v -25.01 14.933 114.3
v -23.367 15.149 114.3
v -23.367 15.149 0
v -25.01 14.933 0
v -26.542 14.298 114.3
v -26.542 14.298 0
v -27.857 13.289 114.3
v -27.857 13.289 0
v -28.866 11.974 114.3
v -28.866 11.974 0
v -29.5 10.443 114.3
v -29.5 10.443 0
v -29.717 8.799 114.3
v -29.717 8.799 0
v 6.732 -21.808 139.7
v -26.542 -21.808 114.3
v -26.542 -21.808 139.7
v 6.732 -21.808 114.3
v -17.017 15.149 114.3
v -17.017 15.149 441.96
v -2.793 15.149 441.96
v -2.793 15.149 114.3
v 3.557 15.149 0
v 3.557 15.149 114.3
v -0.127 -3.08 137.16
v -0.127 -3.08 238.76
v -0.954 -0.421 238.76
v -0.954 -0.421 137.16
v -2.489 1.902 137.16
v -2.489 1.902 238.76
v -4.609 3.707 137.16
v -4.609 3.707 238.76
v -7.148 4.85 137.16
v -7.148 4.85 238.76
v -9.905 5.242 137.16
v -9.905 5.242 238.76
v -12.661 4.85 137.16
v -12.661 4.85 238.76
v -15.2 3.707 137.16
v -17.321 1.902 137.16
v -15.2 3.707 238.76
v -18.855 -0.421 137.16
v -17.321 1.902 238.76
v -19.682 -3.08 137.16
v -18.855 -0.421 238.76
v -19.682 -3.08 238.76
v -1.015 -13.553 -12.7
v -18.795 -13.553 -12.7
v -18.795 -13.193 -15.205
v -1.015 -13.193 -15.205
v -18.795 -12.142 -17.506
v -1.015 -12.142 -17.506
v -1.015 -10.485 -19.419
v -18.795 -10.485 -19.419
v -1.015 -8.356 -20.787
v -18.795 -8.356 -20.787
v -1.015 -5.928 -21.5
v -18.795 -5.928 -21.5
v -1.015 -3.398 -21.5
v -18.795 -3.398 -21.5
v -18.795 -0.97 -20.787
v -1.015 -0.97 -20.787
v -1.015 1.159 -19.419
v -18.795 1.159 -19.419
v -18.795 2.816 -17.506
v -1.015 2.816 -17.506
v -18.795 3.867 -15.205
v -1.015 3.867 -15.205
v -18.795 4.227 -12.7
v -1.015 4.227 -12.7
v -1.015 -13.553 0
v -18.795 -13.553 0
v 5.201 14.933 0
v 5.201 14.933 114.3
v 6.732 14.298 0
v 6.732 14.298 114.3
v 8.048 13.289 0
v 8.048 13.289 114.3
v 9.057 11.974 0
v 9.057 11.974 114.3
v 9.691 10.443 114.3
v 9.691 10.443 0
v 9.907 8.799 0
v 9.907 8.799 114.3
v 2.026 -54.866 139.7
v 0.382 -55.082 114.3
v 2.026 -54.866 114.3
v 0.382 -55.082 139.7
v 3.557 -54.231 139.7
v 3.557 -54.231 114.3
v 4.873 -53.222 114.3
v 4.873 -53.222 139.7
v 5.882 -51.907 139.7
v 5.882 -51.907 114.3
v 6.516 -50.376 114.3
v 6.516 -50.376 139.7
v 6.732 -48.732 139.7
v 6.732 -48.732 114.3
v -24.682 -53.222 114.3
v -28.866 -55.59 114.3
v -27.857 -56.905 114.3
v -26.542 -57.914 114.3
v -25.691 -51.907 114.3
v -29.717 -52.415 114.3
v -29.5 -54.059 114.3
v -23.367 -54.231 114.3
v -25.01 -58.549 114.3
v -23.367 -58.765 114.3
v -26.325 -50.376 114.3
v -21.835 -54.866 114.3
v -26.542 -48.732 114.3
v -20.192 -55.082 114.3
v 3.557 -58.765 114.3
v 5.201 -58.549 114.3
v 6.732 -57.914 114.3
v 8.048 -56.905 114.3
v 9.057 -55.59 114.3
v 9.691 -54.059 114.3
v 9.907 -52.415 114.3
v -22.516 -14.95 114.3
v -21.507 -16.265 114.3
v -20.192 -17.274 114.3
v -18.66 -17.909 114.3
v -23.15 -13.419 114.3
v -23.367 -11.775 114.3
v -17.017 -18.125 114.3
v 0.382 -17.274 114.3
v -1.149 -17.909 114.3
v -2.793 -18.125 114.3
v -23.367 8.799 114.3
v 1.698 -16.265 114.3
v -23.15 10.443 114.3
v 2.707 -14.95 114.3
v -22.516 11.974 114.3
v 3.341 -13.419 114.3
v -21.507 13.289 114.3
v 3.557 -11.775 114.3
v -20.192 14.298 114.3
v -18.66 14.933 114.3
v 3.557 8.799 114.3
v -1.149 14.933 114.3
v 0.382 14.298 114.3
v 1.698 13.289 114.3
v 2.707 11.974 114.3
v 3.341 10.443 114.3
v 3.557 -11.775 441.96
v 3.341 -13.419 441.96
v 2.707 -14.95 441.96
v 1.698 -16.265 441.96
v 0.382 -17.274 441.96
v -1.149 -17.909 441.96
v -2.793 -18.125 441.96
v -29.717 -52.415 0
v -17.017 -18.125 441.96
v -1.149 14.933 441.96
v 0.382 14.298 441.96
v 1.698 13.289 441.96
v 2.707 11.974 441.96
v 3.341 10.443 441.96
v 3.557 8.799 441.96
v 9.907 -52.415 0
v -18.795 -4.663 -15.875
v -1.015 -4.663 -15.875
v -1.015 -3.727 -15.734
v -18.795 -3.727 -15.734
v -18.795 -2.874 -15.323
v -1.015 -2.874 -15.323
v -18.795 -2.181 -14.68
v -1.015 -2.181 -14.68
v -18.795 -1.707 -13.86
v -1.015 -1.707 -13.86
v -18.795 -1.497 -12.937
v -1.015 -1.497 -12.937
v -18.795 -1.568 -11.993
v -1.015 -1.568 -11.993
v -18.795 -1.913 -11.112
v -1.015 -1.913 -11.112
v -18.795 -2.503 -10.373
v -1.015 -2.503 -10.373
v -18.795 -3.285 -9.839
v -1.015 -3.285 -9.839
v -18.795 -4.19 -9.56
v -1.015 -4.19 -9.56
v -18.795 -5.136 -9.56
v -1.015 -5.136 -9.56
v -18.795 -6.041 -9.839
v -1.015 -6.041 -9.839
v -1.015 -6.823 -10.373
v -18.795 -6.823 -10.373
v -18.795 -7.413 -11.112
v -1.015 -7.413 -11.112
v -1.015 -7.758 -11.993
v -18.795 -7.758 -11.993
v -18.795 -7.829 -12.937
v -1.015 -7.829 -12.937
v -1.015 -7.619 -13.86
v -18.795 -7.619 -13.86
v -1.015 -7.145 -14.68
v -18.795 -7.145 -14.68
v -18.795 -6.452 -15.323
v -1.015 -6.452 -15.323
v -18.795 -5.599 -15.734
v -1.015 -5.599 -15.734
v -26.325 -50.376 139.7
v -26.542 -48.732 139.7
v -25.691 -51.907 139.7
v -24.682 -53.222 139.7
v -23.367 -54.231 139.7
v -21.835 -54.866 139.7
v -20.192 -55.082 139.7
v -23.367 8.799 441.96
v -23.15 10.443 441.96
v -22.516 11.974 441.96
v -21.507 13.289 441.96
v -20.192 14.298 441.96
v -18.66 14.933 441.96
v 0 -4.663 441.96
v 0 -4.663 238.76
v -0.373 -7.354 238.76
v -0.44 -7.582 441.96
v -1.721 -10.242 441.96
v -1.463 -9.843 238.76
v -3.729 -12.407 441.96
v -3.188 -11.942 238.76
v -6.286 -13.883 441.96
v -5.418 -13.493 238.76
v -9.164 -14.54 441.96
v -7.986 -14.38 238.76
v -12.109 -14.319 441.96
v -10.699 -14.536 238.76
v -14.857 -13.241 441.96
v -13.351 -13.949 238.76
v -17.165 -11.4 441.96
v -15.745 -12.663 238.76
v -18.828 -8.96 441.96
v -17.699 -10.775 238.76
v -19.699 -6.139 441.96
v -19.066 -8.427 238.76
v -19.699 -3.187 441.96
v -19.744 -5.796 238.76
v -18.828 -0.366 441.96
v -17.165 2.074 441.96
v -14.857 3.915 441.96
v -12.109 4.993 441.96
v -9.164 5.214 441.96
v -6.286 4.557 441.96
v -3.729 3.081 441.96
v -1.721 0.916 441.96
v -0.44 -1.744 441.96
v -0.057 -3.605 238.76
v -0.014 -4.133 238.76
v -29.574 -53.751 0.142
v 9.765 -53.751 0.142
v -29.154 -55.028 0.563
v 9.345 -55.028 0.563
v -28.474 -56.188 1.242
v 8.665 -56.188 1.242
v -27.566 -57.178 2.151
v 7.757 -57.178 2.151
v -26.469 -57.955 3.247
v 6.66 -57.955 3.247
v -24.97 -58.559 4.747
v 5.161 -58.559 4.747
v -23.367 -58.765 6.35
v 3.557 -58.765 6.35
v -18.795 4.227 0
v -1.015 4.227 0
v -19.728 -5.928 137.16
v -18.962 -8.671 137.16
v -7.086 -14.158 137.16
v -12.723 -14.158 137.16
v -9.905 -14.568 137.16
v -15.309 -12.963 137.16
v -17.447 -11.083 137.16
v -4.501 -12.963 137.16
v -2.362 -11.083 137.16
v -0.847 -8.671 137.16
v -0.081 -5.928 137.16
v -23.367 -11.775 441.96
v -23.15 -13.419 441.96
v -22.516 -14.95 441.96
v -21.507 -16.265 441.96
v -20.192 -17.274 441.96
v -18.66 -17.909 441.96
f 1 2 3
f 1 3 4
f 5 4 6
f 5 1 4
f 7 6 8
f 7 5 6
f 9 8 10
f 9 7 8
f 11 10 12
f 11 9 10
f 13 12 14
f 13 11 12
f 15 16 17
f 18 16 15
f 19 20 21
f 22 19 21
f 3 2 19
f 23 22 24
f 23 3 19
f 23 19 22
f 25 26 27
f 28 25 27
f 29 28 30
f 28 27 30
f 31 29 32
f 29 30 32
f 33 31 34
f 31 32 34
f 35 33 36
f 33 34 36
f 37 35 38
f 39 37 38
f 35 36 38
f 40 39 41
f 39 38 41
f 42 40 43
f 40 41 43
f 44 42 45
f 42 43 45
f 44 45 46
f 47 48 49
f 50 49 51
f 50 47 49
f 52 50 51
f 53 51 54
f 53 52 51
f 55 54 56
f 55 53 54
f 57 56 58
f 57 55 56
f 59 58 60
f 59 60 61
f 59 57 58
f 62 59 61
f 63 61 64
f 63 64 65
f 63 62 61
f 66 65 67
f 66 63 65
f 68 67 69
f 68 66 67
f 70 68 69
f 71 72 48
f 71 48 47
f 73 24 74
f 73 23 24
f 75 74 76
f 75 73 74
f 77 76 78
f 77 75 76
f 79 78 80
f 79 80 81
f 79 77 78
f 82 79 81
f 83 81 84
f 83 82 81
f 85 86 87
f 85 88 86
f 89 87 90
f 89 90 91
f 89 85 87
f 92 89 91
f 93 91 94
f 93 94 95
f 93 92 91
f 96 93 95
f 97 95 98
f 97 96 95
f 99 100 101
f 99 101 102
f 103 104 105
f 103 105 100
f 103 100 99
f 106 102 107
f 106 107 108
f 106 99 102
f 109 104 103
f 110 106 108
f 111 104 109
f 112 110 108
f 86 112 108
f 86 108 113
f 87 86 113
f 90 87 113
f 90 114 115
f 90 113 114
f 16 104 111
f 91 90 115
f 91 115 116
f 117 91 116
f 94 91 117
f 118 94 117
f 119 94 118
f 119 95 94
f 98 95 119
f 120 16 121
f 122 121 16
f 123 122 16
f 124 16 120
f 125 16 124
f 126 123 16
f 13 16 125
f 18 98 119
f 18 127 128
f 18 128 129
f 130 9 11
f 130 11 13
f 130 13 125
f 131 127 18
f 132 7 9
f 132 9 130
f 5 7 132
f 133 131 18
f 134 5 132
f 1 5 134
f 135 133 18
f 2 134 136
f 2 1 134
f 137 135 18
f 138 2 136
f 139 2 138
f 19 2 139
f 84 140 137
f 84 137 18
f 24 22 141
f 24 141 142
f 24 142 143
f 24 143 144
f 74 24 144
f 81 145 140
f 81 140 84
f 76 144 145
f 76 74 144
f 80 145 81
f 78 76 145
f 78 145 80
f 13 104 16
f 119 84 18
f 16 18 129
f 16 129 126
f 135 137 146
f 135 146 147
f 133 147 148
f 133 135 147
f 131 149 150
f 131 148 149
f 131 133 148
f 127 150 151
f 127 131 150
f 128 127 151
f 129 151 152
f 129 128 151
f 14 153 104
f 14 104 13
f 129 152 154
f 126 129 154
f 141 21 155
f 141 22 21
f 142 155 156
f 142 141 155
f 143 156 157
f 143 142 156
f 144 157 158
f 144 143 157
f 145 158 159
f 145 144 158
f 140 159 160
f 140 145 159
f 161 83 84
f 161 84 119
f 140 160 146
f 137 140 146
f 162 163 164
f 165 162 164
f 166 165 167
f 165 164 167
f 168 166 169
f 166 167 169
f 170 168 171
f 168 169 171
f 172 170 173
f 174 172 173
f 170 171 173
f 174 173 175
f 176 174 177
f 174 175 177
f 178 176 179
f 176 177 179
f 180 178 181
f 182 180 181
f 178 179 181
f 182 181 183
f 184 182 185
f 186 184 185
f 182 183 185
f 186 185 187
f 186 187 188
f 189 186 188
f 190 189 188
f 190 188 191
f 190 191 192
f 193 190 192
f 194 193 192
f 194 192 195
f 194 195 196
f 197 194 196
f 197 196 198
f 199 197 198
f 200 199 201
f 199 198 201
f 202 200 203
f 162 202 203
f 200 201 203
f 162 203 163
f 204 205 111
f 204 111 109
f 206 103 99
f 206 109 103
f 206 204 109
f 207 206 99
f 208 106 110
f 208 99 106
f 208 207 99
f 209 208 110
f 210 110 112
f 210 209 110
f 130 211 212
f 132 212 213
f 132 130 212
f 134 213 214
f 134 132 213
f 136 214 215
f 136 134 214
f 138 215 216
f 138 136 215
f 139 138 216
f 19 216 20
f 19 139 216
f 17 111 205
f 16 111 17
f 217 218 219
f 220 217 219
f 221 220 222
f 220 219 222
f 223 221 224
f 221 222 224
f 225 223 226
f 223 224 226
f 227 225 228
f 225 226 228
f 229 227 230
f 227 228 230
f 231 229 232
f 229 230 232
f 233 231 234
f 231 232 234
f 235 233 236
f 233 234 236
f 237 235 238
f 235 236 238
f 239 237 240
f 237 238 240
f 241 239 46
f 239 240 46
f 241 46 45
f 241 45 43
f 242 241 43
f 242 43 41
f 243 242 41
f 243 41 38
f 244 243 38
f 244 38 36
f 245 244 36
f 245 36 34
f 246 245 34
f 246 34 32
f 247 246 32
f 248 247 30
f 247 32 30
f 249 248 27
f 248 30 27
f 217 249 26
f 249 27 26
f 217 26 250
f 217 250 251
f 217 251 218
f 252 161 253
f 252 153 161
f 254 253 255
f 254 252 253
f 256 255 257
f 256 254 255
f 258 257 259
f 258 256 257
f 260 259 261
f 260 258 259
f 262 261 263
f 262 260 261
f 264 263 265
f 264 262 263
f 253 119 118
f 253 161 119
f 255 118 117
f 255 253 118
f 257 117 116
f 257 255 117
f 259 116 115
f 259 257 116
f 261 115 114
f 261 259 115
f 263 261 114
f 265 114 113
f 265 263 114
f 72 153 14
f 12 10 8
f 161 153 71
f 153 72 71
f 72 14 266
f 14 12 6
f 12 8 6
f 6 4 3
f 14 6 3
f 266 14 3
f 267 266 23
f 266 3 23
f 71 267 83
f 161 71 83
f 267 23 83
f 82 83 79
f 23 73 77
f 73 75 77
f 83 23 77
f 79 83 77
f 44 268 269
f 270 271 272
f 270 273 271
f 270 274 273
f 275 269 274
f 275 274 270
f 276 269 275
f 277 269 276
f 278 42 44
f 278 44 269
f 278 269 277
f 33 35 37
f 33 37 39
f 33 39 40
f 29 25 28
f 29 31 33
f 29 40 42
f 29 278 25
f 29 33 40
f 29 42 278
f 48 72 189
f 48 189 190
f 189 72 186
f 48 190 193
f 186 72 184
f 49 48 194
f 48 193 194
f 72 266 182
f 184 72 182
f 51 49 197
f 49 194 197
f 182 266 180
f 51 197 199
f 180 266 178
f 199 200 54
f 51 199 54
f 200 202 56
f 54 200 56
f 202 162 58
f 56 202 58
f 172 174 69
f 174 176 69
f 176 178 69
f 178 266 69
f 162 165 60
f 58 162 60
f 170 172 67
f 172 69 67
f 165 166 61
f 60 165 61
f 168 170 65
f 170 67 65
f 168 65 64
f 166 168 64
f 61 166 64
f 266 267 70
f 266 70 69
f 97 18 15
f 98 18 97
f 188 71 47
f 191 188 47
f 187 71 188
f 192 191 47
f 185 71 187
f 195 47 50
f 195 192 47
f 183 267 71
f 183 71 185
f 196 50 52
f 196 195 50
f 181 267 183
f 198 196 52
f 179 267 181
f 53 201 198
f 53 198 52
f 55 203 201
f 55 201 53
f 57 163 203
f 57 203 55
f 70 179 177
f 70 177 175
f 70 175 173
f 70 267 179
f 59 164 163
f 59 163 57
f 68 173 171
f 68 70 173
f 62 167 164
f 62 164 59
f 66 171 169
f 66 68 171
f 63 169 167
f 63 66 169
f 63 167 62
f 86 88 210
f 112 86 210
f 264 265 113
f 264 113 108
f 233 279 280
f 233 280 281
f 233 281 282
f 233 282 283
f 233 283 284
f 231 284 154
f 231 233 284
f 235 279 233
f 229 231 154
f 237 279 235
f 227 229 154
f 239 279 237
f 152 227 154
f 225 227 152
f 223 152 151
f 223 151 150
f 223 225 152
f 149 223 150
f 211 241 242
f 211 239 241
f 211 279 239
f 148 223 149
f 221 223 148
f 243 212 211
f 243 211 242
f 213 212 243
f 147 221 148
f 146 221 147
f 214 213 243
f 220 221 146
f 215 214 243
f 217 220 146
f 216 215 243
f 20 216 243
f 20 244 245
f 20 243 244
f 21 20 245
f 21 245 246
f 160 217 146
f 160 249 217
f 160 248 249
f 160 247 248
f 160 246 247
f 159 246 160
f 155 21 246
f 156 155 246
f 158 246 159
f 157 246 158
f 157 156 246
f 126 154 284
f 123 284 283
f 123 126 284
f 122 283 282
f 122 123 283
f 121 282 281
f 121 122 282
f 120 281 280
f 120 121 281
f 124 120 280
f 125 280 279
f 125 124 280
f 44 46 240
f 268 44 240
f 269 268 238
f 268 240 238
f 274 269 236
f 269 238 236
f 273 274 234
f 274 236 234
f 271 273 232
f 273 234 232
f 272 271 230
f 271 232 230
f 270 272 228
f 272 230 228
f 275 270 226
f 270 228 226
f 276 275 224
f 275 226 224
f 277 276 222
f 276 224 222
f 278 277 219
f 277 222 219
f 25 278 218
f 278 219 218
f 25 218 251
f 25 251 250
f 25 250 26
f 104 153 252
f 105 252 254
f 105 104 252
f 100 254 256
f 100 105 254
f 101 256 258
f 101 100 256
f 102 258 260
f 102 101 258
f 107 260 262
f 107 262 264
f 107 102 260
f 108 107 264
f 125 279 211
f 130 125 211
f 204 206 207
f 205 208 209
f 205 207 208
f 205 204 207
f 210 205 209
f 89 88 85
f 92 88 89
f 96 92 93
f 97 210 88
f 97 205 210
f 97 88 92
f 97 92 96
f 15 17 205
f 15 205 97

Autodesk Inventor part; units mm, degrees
ref_plane "YZ Plane" through (0, 0, 0) normal (1, 0, 0) x (0, 1, 0)
ref_plane "XZ Plane" through (0, 0, 0) normal (0, 1, 0) x (-1, 0, 0)
ref_plane "XY Plane" through (0, 0, 0) normal (0, 0, 1) x (1, 0, 0)
sketch "Sketch1" plane through (0, 0, 0) normal (0, 0, 1) x (1, 0, 0)
  line L0 (-29.7166, 15.149) -> (9.9074, 15.149)
  line L1 (9.9074, 15.149) -> (9.9074, -58.765)
  line L2 (9.9074, -58.765) -> (-29.7166, -58.765)
  line L3 (-29.7166, -58.765) -> (-29.7166, 15.149)
  point P0 (0, 0)
  dimension "d0" = 39.624
  dimension "d1" = 73.914
extrude "Extrusion1" add sketch "Sketch1" along normal blind 76.2
sketch "Sketch2" plane through (0, 0, 76.2) normal (0, 0, 1) x (1, 0, 0)
  line L0 (9.9074, 15.149) -> (9.9074, -58.765) projected
  line L1 (-29.7166, 15.149) -> (9.9074, 15.149)
  line L2 (9.9074, 15.149) -> (9.9074, -24.475)
  line L3 (9.9074, -24.475) -> (-29.7166, -24.475)
  line L4 (-29.7166, -24.475) -> (-29.7166, 15.149)
  line L5 (-29.7166, -24.475) -> (-23.3666, -24.475)
  line L6 (-23.3666, -24.475) -> (-23.3666, -18.125)
  line L7 (-23.3666, -18.125) -> (-29.7166, -18.125)
  line L8 (-29.7166, -18.125) -> (-29.7166, -24.475)
  line L9 (-23.3666, -18.125) -> (3.5574, -18.125)
  line L10 (3.5574, -18.125) -> (3.5574, 15.149)
  line L11 (3.5574, 15.149) -> (-23.3666, 15.149)
  line L12 (-23.3666, 15.149) -> (-23.3666, -18.125)
  point P0 (0, 0)
  dimension "d4" = 39.624
  dimension "d5" = 6.35
  dimension "d6" = 6.35
  dimension "d7" = 26.924
extrude "Extrusion2" add sketch "Sketch2" along normal blind 162.56 contours L10 L9 L12 L1
sketch "Sketch3" plane through (0, 0, 238.76) normal (0, 0, 1) x (1, 0, 0)
  line L0 (-23.3666, 15.149) -> (3.5574, -18.125)
  line L1 (3.5574, 15.149) -> (-23.3666, -18.125)
  circle A0 centre (-9.9046, -1.488) radius 9.906
  point P0 (0, 0)
  dimension "d10" = 19.812
extrude "Extrusion3" cut sketch "Sketch3" against normal blind 203.2
sketch "Sketch4" plane through (0, 0, 76.2) normal (0, 0, 1) x (1, 0, 0)
  line L0 (3.5574, 15.149) -> (3.5574, -18.125) projected
  line L1 (3.5574, -18.125) -> (-23.3666, -18.125) projected
  line L2 (-23.3666, -18.125) -> (-23.3666, 15.149) projected
  line L3 (-29.7166, 15.149) -> (-23.3666, 15.149) projected
  line L4 (-29.7166, -58.765) -> (-29.7166, 15.149) projected
  line L5 (9.9074, -58.765) -> (-29.7166, -58.765) projected
  line L6 (9.9074, 15.149) -> (9.9074, -58.765) projected
  line L7 (3.5574, 15.149) -> (9.9074, 15.149) projected
  point P0 (0, 0)
extrude "Extrusion4" cut sketch "Sketch4" against normal blind 25.4
sketch "Sketch5" plane through (0, 0, 50.8) normal (0, 0, 1) x (1, 0, 0)
  line L0 (-26.5416, -21.808) -> (6.7324, -21.808)
  line L1 (6.7324, -21.808) -> (6.7324, -55.082)
  line L2 (6.7324, -55.082) -> (-26.5416, -55.082)
  line L3 (-26.5416, -55.082) -> (-26.5416, -21.808)
  point P0 (0, 0)
  dimension "d15" = 33.274
extrude "Extrusion5" add sketch "Sketch5" along normal blind 88.9
sketch "Sketch6" plane through (0, 0, 50.8) normal (0, 0, 1) x (1, 0, 0)
  line L0 (6.7324, -21.808) -> (6.7324, -55.082) projected
  line L1 (6.7324, -55.082) -> (-26.5416, -55.082) projected
  line L2 (-26.5416, -55.082) -> (-26.5416, -21.808) projected
  line L3 (-26.5416, -21.808) -> (6.7324, -21.808) projected
  line L4 (3.5574, -18.125) -> (-23.3666, -18.125) projected
  line L5 (-23.3666, -18.125) -> (-23.3666, 15.149) projected
  line L6 (-29.7166, 15.149) -> (-23.3666, 15.149) projected
  line L7 (-29.7166, -58.765) -> (-29.7166, 15.149) projected
  line L8 (9.9074, -58.765) -> (-29.7166, -58.765) projected
  line L9 (9.9074, 15.149) -> (9.9074, -58.765) projected
  line L10 (3.5574, 15.149) -> (9.9074, 15.149) projected
  line L11 (3.5574, 15.149) -> (3.5574, -18.125) projected
  point P0 (0, 0)
extrude "Extrusion6" add sketch "Sketch6" along normal blind 25.4
sketch "Sketch7" plane through (0, 0, 0) normal (0, 0, -1) x (-1, 0, 0)
  line L0 (-9.9074, 15.149) -> (-9.9074, -58.765) projected
  line L1 (29.7166, -58.765) -> (29.7166, 15.149) projected
  line L2 (-9.9074, 15.149) -> (29.7166, -24.475)
  line L3 (-9.9074, 15.149) -> (46.1294, 15.149) construction
  line L4 (29.7166, 15.149) -> (-9.9074, -24.475)
  line L5 (1.0146, 4.227) -> (18.7946, 4.227)
  line L6 (1.0146, 4.227) -> (18.7946, 4.227)
  line L7 (18.7946, 4.227) -> (18.7946, -13.553)
  line L8 (18.7946, -13.553) -> (1.0146, -13.553)
  line L9 (1.0146, -13.553) -> (1.0146, 4.227)
  point P0 (0, 0)
  dimension "d20" = 45
  dimension "d21" = 17.78
extrude "Extrusion7" add sketch "Sketch7" along normal blind 12.7 contours L5 L4 L2 | L2 L4 L9 | L4 L2 L8 | L4 L7 L2
sketch "Sketch8" plane through (-18.7946, -13.553, 0) normal (-1, 0, 0) x (0, 0, 1)
  line L0 (-12.7, 17.78) -> (-12.7, 0) projected
  circle A0 centre (-12.7, 8.89) radius 3.175
  point P0 (0, 13.553)
  dimension "d24" = 6.35
extrude "Extrusion8" cut sketch "Sketch8" against normal blind 25.4
sketch "Sketch9" plane through (-1.0146, -13.553, 0) normal (1, 0, 0) x (0, 0, -1)
  arc A0 (12.7, 12.065) -> (12.7, 5.715) centre (12.7, 8.89) ccw projected
  circle A1 centre (12.7, 8.89) radius 3.175
  circle A2 centre (12.7, 8.89) radius 8.89
  point P0 (0, 13.553)
extrude "Extrusion9" add sketch "Sketch9" against normal blind 17.78
sketch "Sketch10" plane through (0, 0, 76.2) normal (0, 0, 1) x (1, 0, 0)
  line L0 (-26.5416, -55.082) -> (6.7324, -55.082) projected
  line L1 (-26.5416, -21.808) -> (-26.5416, -55.082) projected
  line L2 (6.7324, -21.808) -> (-26.5416, -21.808) projected
  line L3 (6.7324, -55.082) -> (6.7324, -21.808) projected
  line L4 (3.5574, -18.125) -> (3.5574, 15.149) projected
  line L5 (-23.3666, -18.125) -> (3.5574, -18.125) projected
  line L6 (-23.3666, 15.149) -> (-23.3666, -18.125) projected
  line L7 (-29.7166, 15.149) -> (-23.3666, 15.149) projected
  line L8 (-29.7166, -58.765) -> (-29.7166, 15.149) projected
  line L9 (9.9074, -58.765) -> (-29.7166, -58.765) projected
  line L10 (9.9074, 15.149) -> (9.9074, -58.765) projected
  line L11 (3.5574, 15.149) -> (9.9074, 15.149) projected
  point P0 (0, 0)
extrude "Extrusion10" add sketch "Sketch10" along normal blind 38.1
fillet "Fillet1" radius 6.35 11 edges at (9.9074, 15.149, 57.15) (-29.7166, 15.149, 57.15) (9.9074, -58.765, 57.15) (-29.7166, -58.765, 57.15) (-26.5416, -55.082, 127) (6.7324, -55.082, 127) (-9.9046, -58.765, 0) (-23.3666, 15.149, 176.53) (3.5574, 15.149, 176.53) (-23.3666, -18.125, 176.53) (3.5574, -18.125, 176.53)
sketch "Sketch11" plane through (0, 0, 238.76) normal (0, 0, 1) x (1, 0, 0)
  line L0 (-17.0166, 15.149) -> (-2.7926, 15.149) projected
  line L1 (-2.7926, -18.125) -> (-17.0166, -18.125) projected
  line L2 (-9.9046, 15.149) -> (-9.9046, -4.663)
  circle A0 centre (-9.9046, -4.663) radius 9.9046
  point P0 (0, 0)
  dimension "d32" = 19.812
extrude "Extrusion11" cut sketch "Sketch11" against normal blind 101.6
sketch "Sketch12" plane through (0, 0, 238.76) normal (0, 0, 1) x (1, 0, 0)
  arc A0 (-19.6818, -3.0799) -> (-0.1273, -3.0799) centre (-9.9046, -4.663) ccw projected
  arc A1 (-0.1273, -3.0799) -> (-19.6818, -3.0799) centre (-9.9046, -1.488) ccw projected
  circle A2 centre (-9.9046, -1.488) radius 9.906
  circle A3 centre (-9.9046, -4.663) radius 9.9046
  point P0 (0, 0)
extrude "Extrusion12" add sketch "Sketch12" against normal blind 228.6 contours A3 A2 | A1 A3
sketch "Sketch13" plane through (0, 0, 238.76) normal (0, 0, 1) x (1, 0, 0)
  arc A0 (-19.6818, -3.0799) -> (-0.1273, -3.0799) centre (-9.9046, -4.663) ccw projected
  arc A1 (-19.6818, -3.0799) -> (-0.1273, -3.0799) centre (-9.9046, -1.488) ccw projected
  circle A2 centre (-9.9046, -4.663) radius 9.9046
  point P0 (0, 0)
extrude "Extrusion13" cut sketch "Sketch13" against normal blind 101.6 contours A2 A1
sketch "Sketch14" plane through (0, 0, 238.76) normal (0, 0, 1) x (1, 0, 0)
  circle A0 centre (-9.9046, -4.663) radius 9.9046 projected
  arc A1 (-2.7926, -18.125) -> (3.5574, -11.775) centre (-2.7926, -11.775) ccw projected
  line L0 (3.5574, 8.799) -> (3.5574, -11.775) projected
  arc A2 (3.5574, 8.799) -> (-2.7926, 15.149) centre (-2.7926, 8.799) ccw projected
  line L1 (-17.0166, 15.149) -> (-2.7926, 15.149) projected
  arc A3 (-17.0166, 15.149) -> (-23.3666, 8.799) centre (-17.0166, 8.799) ccw projected
  line L2 (-23.3666, -11.775) -> (-23.3666, 8.799) projected
  arc A4 (-23.3666, -11.775) -> (-17.0166, -18.125) centre (-17.0166, -11.775) ccw projected
  line L3 (-2.7926, -18.125) -> (-17.0166, -18.125) projected
  point P0 (0, 0)
extrude "Extrusion14" add sketch "Sketch14" along normal blind 203.2
properties part number "linac body 12in"
